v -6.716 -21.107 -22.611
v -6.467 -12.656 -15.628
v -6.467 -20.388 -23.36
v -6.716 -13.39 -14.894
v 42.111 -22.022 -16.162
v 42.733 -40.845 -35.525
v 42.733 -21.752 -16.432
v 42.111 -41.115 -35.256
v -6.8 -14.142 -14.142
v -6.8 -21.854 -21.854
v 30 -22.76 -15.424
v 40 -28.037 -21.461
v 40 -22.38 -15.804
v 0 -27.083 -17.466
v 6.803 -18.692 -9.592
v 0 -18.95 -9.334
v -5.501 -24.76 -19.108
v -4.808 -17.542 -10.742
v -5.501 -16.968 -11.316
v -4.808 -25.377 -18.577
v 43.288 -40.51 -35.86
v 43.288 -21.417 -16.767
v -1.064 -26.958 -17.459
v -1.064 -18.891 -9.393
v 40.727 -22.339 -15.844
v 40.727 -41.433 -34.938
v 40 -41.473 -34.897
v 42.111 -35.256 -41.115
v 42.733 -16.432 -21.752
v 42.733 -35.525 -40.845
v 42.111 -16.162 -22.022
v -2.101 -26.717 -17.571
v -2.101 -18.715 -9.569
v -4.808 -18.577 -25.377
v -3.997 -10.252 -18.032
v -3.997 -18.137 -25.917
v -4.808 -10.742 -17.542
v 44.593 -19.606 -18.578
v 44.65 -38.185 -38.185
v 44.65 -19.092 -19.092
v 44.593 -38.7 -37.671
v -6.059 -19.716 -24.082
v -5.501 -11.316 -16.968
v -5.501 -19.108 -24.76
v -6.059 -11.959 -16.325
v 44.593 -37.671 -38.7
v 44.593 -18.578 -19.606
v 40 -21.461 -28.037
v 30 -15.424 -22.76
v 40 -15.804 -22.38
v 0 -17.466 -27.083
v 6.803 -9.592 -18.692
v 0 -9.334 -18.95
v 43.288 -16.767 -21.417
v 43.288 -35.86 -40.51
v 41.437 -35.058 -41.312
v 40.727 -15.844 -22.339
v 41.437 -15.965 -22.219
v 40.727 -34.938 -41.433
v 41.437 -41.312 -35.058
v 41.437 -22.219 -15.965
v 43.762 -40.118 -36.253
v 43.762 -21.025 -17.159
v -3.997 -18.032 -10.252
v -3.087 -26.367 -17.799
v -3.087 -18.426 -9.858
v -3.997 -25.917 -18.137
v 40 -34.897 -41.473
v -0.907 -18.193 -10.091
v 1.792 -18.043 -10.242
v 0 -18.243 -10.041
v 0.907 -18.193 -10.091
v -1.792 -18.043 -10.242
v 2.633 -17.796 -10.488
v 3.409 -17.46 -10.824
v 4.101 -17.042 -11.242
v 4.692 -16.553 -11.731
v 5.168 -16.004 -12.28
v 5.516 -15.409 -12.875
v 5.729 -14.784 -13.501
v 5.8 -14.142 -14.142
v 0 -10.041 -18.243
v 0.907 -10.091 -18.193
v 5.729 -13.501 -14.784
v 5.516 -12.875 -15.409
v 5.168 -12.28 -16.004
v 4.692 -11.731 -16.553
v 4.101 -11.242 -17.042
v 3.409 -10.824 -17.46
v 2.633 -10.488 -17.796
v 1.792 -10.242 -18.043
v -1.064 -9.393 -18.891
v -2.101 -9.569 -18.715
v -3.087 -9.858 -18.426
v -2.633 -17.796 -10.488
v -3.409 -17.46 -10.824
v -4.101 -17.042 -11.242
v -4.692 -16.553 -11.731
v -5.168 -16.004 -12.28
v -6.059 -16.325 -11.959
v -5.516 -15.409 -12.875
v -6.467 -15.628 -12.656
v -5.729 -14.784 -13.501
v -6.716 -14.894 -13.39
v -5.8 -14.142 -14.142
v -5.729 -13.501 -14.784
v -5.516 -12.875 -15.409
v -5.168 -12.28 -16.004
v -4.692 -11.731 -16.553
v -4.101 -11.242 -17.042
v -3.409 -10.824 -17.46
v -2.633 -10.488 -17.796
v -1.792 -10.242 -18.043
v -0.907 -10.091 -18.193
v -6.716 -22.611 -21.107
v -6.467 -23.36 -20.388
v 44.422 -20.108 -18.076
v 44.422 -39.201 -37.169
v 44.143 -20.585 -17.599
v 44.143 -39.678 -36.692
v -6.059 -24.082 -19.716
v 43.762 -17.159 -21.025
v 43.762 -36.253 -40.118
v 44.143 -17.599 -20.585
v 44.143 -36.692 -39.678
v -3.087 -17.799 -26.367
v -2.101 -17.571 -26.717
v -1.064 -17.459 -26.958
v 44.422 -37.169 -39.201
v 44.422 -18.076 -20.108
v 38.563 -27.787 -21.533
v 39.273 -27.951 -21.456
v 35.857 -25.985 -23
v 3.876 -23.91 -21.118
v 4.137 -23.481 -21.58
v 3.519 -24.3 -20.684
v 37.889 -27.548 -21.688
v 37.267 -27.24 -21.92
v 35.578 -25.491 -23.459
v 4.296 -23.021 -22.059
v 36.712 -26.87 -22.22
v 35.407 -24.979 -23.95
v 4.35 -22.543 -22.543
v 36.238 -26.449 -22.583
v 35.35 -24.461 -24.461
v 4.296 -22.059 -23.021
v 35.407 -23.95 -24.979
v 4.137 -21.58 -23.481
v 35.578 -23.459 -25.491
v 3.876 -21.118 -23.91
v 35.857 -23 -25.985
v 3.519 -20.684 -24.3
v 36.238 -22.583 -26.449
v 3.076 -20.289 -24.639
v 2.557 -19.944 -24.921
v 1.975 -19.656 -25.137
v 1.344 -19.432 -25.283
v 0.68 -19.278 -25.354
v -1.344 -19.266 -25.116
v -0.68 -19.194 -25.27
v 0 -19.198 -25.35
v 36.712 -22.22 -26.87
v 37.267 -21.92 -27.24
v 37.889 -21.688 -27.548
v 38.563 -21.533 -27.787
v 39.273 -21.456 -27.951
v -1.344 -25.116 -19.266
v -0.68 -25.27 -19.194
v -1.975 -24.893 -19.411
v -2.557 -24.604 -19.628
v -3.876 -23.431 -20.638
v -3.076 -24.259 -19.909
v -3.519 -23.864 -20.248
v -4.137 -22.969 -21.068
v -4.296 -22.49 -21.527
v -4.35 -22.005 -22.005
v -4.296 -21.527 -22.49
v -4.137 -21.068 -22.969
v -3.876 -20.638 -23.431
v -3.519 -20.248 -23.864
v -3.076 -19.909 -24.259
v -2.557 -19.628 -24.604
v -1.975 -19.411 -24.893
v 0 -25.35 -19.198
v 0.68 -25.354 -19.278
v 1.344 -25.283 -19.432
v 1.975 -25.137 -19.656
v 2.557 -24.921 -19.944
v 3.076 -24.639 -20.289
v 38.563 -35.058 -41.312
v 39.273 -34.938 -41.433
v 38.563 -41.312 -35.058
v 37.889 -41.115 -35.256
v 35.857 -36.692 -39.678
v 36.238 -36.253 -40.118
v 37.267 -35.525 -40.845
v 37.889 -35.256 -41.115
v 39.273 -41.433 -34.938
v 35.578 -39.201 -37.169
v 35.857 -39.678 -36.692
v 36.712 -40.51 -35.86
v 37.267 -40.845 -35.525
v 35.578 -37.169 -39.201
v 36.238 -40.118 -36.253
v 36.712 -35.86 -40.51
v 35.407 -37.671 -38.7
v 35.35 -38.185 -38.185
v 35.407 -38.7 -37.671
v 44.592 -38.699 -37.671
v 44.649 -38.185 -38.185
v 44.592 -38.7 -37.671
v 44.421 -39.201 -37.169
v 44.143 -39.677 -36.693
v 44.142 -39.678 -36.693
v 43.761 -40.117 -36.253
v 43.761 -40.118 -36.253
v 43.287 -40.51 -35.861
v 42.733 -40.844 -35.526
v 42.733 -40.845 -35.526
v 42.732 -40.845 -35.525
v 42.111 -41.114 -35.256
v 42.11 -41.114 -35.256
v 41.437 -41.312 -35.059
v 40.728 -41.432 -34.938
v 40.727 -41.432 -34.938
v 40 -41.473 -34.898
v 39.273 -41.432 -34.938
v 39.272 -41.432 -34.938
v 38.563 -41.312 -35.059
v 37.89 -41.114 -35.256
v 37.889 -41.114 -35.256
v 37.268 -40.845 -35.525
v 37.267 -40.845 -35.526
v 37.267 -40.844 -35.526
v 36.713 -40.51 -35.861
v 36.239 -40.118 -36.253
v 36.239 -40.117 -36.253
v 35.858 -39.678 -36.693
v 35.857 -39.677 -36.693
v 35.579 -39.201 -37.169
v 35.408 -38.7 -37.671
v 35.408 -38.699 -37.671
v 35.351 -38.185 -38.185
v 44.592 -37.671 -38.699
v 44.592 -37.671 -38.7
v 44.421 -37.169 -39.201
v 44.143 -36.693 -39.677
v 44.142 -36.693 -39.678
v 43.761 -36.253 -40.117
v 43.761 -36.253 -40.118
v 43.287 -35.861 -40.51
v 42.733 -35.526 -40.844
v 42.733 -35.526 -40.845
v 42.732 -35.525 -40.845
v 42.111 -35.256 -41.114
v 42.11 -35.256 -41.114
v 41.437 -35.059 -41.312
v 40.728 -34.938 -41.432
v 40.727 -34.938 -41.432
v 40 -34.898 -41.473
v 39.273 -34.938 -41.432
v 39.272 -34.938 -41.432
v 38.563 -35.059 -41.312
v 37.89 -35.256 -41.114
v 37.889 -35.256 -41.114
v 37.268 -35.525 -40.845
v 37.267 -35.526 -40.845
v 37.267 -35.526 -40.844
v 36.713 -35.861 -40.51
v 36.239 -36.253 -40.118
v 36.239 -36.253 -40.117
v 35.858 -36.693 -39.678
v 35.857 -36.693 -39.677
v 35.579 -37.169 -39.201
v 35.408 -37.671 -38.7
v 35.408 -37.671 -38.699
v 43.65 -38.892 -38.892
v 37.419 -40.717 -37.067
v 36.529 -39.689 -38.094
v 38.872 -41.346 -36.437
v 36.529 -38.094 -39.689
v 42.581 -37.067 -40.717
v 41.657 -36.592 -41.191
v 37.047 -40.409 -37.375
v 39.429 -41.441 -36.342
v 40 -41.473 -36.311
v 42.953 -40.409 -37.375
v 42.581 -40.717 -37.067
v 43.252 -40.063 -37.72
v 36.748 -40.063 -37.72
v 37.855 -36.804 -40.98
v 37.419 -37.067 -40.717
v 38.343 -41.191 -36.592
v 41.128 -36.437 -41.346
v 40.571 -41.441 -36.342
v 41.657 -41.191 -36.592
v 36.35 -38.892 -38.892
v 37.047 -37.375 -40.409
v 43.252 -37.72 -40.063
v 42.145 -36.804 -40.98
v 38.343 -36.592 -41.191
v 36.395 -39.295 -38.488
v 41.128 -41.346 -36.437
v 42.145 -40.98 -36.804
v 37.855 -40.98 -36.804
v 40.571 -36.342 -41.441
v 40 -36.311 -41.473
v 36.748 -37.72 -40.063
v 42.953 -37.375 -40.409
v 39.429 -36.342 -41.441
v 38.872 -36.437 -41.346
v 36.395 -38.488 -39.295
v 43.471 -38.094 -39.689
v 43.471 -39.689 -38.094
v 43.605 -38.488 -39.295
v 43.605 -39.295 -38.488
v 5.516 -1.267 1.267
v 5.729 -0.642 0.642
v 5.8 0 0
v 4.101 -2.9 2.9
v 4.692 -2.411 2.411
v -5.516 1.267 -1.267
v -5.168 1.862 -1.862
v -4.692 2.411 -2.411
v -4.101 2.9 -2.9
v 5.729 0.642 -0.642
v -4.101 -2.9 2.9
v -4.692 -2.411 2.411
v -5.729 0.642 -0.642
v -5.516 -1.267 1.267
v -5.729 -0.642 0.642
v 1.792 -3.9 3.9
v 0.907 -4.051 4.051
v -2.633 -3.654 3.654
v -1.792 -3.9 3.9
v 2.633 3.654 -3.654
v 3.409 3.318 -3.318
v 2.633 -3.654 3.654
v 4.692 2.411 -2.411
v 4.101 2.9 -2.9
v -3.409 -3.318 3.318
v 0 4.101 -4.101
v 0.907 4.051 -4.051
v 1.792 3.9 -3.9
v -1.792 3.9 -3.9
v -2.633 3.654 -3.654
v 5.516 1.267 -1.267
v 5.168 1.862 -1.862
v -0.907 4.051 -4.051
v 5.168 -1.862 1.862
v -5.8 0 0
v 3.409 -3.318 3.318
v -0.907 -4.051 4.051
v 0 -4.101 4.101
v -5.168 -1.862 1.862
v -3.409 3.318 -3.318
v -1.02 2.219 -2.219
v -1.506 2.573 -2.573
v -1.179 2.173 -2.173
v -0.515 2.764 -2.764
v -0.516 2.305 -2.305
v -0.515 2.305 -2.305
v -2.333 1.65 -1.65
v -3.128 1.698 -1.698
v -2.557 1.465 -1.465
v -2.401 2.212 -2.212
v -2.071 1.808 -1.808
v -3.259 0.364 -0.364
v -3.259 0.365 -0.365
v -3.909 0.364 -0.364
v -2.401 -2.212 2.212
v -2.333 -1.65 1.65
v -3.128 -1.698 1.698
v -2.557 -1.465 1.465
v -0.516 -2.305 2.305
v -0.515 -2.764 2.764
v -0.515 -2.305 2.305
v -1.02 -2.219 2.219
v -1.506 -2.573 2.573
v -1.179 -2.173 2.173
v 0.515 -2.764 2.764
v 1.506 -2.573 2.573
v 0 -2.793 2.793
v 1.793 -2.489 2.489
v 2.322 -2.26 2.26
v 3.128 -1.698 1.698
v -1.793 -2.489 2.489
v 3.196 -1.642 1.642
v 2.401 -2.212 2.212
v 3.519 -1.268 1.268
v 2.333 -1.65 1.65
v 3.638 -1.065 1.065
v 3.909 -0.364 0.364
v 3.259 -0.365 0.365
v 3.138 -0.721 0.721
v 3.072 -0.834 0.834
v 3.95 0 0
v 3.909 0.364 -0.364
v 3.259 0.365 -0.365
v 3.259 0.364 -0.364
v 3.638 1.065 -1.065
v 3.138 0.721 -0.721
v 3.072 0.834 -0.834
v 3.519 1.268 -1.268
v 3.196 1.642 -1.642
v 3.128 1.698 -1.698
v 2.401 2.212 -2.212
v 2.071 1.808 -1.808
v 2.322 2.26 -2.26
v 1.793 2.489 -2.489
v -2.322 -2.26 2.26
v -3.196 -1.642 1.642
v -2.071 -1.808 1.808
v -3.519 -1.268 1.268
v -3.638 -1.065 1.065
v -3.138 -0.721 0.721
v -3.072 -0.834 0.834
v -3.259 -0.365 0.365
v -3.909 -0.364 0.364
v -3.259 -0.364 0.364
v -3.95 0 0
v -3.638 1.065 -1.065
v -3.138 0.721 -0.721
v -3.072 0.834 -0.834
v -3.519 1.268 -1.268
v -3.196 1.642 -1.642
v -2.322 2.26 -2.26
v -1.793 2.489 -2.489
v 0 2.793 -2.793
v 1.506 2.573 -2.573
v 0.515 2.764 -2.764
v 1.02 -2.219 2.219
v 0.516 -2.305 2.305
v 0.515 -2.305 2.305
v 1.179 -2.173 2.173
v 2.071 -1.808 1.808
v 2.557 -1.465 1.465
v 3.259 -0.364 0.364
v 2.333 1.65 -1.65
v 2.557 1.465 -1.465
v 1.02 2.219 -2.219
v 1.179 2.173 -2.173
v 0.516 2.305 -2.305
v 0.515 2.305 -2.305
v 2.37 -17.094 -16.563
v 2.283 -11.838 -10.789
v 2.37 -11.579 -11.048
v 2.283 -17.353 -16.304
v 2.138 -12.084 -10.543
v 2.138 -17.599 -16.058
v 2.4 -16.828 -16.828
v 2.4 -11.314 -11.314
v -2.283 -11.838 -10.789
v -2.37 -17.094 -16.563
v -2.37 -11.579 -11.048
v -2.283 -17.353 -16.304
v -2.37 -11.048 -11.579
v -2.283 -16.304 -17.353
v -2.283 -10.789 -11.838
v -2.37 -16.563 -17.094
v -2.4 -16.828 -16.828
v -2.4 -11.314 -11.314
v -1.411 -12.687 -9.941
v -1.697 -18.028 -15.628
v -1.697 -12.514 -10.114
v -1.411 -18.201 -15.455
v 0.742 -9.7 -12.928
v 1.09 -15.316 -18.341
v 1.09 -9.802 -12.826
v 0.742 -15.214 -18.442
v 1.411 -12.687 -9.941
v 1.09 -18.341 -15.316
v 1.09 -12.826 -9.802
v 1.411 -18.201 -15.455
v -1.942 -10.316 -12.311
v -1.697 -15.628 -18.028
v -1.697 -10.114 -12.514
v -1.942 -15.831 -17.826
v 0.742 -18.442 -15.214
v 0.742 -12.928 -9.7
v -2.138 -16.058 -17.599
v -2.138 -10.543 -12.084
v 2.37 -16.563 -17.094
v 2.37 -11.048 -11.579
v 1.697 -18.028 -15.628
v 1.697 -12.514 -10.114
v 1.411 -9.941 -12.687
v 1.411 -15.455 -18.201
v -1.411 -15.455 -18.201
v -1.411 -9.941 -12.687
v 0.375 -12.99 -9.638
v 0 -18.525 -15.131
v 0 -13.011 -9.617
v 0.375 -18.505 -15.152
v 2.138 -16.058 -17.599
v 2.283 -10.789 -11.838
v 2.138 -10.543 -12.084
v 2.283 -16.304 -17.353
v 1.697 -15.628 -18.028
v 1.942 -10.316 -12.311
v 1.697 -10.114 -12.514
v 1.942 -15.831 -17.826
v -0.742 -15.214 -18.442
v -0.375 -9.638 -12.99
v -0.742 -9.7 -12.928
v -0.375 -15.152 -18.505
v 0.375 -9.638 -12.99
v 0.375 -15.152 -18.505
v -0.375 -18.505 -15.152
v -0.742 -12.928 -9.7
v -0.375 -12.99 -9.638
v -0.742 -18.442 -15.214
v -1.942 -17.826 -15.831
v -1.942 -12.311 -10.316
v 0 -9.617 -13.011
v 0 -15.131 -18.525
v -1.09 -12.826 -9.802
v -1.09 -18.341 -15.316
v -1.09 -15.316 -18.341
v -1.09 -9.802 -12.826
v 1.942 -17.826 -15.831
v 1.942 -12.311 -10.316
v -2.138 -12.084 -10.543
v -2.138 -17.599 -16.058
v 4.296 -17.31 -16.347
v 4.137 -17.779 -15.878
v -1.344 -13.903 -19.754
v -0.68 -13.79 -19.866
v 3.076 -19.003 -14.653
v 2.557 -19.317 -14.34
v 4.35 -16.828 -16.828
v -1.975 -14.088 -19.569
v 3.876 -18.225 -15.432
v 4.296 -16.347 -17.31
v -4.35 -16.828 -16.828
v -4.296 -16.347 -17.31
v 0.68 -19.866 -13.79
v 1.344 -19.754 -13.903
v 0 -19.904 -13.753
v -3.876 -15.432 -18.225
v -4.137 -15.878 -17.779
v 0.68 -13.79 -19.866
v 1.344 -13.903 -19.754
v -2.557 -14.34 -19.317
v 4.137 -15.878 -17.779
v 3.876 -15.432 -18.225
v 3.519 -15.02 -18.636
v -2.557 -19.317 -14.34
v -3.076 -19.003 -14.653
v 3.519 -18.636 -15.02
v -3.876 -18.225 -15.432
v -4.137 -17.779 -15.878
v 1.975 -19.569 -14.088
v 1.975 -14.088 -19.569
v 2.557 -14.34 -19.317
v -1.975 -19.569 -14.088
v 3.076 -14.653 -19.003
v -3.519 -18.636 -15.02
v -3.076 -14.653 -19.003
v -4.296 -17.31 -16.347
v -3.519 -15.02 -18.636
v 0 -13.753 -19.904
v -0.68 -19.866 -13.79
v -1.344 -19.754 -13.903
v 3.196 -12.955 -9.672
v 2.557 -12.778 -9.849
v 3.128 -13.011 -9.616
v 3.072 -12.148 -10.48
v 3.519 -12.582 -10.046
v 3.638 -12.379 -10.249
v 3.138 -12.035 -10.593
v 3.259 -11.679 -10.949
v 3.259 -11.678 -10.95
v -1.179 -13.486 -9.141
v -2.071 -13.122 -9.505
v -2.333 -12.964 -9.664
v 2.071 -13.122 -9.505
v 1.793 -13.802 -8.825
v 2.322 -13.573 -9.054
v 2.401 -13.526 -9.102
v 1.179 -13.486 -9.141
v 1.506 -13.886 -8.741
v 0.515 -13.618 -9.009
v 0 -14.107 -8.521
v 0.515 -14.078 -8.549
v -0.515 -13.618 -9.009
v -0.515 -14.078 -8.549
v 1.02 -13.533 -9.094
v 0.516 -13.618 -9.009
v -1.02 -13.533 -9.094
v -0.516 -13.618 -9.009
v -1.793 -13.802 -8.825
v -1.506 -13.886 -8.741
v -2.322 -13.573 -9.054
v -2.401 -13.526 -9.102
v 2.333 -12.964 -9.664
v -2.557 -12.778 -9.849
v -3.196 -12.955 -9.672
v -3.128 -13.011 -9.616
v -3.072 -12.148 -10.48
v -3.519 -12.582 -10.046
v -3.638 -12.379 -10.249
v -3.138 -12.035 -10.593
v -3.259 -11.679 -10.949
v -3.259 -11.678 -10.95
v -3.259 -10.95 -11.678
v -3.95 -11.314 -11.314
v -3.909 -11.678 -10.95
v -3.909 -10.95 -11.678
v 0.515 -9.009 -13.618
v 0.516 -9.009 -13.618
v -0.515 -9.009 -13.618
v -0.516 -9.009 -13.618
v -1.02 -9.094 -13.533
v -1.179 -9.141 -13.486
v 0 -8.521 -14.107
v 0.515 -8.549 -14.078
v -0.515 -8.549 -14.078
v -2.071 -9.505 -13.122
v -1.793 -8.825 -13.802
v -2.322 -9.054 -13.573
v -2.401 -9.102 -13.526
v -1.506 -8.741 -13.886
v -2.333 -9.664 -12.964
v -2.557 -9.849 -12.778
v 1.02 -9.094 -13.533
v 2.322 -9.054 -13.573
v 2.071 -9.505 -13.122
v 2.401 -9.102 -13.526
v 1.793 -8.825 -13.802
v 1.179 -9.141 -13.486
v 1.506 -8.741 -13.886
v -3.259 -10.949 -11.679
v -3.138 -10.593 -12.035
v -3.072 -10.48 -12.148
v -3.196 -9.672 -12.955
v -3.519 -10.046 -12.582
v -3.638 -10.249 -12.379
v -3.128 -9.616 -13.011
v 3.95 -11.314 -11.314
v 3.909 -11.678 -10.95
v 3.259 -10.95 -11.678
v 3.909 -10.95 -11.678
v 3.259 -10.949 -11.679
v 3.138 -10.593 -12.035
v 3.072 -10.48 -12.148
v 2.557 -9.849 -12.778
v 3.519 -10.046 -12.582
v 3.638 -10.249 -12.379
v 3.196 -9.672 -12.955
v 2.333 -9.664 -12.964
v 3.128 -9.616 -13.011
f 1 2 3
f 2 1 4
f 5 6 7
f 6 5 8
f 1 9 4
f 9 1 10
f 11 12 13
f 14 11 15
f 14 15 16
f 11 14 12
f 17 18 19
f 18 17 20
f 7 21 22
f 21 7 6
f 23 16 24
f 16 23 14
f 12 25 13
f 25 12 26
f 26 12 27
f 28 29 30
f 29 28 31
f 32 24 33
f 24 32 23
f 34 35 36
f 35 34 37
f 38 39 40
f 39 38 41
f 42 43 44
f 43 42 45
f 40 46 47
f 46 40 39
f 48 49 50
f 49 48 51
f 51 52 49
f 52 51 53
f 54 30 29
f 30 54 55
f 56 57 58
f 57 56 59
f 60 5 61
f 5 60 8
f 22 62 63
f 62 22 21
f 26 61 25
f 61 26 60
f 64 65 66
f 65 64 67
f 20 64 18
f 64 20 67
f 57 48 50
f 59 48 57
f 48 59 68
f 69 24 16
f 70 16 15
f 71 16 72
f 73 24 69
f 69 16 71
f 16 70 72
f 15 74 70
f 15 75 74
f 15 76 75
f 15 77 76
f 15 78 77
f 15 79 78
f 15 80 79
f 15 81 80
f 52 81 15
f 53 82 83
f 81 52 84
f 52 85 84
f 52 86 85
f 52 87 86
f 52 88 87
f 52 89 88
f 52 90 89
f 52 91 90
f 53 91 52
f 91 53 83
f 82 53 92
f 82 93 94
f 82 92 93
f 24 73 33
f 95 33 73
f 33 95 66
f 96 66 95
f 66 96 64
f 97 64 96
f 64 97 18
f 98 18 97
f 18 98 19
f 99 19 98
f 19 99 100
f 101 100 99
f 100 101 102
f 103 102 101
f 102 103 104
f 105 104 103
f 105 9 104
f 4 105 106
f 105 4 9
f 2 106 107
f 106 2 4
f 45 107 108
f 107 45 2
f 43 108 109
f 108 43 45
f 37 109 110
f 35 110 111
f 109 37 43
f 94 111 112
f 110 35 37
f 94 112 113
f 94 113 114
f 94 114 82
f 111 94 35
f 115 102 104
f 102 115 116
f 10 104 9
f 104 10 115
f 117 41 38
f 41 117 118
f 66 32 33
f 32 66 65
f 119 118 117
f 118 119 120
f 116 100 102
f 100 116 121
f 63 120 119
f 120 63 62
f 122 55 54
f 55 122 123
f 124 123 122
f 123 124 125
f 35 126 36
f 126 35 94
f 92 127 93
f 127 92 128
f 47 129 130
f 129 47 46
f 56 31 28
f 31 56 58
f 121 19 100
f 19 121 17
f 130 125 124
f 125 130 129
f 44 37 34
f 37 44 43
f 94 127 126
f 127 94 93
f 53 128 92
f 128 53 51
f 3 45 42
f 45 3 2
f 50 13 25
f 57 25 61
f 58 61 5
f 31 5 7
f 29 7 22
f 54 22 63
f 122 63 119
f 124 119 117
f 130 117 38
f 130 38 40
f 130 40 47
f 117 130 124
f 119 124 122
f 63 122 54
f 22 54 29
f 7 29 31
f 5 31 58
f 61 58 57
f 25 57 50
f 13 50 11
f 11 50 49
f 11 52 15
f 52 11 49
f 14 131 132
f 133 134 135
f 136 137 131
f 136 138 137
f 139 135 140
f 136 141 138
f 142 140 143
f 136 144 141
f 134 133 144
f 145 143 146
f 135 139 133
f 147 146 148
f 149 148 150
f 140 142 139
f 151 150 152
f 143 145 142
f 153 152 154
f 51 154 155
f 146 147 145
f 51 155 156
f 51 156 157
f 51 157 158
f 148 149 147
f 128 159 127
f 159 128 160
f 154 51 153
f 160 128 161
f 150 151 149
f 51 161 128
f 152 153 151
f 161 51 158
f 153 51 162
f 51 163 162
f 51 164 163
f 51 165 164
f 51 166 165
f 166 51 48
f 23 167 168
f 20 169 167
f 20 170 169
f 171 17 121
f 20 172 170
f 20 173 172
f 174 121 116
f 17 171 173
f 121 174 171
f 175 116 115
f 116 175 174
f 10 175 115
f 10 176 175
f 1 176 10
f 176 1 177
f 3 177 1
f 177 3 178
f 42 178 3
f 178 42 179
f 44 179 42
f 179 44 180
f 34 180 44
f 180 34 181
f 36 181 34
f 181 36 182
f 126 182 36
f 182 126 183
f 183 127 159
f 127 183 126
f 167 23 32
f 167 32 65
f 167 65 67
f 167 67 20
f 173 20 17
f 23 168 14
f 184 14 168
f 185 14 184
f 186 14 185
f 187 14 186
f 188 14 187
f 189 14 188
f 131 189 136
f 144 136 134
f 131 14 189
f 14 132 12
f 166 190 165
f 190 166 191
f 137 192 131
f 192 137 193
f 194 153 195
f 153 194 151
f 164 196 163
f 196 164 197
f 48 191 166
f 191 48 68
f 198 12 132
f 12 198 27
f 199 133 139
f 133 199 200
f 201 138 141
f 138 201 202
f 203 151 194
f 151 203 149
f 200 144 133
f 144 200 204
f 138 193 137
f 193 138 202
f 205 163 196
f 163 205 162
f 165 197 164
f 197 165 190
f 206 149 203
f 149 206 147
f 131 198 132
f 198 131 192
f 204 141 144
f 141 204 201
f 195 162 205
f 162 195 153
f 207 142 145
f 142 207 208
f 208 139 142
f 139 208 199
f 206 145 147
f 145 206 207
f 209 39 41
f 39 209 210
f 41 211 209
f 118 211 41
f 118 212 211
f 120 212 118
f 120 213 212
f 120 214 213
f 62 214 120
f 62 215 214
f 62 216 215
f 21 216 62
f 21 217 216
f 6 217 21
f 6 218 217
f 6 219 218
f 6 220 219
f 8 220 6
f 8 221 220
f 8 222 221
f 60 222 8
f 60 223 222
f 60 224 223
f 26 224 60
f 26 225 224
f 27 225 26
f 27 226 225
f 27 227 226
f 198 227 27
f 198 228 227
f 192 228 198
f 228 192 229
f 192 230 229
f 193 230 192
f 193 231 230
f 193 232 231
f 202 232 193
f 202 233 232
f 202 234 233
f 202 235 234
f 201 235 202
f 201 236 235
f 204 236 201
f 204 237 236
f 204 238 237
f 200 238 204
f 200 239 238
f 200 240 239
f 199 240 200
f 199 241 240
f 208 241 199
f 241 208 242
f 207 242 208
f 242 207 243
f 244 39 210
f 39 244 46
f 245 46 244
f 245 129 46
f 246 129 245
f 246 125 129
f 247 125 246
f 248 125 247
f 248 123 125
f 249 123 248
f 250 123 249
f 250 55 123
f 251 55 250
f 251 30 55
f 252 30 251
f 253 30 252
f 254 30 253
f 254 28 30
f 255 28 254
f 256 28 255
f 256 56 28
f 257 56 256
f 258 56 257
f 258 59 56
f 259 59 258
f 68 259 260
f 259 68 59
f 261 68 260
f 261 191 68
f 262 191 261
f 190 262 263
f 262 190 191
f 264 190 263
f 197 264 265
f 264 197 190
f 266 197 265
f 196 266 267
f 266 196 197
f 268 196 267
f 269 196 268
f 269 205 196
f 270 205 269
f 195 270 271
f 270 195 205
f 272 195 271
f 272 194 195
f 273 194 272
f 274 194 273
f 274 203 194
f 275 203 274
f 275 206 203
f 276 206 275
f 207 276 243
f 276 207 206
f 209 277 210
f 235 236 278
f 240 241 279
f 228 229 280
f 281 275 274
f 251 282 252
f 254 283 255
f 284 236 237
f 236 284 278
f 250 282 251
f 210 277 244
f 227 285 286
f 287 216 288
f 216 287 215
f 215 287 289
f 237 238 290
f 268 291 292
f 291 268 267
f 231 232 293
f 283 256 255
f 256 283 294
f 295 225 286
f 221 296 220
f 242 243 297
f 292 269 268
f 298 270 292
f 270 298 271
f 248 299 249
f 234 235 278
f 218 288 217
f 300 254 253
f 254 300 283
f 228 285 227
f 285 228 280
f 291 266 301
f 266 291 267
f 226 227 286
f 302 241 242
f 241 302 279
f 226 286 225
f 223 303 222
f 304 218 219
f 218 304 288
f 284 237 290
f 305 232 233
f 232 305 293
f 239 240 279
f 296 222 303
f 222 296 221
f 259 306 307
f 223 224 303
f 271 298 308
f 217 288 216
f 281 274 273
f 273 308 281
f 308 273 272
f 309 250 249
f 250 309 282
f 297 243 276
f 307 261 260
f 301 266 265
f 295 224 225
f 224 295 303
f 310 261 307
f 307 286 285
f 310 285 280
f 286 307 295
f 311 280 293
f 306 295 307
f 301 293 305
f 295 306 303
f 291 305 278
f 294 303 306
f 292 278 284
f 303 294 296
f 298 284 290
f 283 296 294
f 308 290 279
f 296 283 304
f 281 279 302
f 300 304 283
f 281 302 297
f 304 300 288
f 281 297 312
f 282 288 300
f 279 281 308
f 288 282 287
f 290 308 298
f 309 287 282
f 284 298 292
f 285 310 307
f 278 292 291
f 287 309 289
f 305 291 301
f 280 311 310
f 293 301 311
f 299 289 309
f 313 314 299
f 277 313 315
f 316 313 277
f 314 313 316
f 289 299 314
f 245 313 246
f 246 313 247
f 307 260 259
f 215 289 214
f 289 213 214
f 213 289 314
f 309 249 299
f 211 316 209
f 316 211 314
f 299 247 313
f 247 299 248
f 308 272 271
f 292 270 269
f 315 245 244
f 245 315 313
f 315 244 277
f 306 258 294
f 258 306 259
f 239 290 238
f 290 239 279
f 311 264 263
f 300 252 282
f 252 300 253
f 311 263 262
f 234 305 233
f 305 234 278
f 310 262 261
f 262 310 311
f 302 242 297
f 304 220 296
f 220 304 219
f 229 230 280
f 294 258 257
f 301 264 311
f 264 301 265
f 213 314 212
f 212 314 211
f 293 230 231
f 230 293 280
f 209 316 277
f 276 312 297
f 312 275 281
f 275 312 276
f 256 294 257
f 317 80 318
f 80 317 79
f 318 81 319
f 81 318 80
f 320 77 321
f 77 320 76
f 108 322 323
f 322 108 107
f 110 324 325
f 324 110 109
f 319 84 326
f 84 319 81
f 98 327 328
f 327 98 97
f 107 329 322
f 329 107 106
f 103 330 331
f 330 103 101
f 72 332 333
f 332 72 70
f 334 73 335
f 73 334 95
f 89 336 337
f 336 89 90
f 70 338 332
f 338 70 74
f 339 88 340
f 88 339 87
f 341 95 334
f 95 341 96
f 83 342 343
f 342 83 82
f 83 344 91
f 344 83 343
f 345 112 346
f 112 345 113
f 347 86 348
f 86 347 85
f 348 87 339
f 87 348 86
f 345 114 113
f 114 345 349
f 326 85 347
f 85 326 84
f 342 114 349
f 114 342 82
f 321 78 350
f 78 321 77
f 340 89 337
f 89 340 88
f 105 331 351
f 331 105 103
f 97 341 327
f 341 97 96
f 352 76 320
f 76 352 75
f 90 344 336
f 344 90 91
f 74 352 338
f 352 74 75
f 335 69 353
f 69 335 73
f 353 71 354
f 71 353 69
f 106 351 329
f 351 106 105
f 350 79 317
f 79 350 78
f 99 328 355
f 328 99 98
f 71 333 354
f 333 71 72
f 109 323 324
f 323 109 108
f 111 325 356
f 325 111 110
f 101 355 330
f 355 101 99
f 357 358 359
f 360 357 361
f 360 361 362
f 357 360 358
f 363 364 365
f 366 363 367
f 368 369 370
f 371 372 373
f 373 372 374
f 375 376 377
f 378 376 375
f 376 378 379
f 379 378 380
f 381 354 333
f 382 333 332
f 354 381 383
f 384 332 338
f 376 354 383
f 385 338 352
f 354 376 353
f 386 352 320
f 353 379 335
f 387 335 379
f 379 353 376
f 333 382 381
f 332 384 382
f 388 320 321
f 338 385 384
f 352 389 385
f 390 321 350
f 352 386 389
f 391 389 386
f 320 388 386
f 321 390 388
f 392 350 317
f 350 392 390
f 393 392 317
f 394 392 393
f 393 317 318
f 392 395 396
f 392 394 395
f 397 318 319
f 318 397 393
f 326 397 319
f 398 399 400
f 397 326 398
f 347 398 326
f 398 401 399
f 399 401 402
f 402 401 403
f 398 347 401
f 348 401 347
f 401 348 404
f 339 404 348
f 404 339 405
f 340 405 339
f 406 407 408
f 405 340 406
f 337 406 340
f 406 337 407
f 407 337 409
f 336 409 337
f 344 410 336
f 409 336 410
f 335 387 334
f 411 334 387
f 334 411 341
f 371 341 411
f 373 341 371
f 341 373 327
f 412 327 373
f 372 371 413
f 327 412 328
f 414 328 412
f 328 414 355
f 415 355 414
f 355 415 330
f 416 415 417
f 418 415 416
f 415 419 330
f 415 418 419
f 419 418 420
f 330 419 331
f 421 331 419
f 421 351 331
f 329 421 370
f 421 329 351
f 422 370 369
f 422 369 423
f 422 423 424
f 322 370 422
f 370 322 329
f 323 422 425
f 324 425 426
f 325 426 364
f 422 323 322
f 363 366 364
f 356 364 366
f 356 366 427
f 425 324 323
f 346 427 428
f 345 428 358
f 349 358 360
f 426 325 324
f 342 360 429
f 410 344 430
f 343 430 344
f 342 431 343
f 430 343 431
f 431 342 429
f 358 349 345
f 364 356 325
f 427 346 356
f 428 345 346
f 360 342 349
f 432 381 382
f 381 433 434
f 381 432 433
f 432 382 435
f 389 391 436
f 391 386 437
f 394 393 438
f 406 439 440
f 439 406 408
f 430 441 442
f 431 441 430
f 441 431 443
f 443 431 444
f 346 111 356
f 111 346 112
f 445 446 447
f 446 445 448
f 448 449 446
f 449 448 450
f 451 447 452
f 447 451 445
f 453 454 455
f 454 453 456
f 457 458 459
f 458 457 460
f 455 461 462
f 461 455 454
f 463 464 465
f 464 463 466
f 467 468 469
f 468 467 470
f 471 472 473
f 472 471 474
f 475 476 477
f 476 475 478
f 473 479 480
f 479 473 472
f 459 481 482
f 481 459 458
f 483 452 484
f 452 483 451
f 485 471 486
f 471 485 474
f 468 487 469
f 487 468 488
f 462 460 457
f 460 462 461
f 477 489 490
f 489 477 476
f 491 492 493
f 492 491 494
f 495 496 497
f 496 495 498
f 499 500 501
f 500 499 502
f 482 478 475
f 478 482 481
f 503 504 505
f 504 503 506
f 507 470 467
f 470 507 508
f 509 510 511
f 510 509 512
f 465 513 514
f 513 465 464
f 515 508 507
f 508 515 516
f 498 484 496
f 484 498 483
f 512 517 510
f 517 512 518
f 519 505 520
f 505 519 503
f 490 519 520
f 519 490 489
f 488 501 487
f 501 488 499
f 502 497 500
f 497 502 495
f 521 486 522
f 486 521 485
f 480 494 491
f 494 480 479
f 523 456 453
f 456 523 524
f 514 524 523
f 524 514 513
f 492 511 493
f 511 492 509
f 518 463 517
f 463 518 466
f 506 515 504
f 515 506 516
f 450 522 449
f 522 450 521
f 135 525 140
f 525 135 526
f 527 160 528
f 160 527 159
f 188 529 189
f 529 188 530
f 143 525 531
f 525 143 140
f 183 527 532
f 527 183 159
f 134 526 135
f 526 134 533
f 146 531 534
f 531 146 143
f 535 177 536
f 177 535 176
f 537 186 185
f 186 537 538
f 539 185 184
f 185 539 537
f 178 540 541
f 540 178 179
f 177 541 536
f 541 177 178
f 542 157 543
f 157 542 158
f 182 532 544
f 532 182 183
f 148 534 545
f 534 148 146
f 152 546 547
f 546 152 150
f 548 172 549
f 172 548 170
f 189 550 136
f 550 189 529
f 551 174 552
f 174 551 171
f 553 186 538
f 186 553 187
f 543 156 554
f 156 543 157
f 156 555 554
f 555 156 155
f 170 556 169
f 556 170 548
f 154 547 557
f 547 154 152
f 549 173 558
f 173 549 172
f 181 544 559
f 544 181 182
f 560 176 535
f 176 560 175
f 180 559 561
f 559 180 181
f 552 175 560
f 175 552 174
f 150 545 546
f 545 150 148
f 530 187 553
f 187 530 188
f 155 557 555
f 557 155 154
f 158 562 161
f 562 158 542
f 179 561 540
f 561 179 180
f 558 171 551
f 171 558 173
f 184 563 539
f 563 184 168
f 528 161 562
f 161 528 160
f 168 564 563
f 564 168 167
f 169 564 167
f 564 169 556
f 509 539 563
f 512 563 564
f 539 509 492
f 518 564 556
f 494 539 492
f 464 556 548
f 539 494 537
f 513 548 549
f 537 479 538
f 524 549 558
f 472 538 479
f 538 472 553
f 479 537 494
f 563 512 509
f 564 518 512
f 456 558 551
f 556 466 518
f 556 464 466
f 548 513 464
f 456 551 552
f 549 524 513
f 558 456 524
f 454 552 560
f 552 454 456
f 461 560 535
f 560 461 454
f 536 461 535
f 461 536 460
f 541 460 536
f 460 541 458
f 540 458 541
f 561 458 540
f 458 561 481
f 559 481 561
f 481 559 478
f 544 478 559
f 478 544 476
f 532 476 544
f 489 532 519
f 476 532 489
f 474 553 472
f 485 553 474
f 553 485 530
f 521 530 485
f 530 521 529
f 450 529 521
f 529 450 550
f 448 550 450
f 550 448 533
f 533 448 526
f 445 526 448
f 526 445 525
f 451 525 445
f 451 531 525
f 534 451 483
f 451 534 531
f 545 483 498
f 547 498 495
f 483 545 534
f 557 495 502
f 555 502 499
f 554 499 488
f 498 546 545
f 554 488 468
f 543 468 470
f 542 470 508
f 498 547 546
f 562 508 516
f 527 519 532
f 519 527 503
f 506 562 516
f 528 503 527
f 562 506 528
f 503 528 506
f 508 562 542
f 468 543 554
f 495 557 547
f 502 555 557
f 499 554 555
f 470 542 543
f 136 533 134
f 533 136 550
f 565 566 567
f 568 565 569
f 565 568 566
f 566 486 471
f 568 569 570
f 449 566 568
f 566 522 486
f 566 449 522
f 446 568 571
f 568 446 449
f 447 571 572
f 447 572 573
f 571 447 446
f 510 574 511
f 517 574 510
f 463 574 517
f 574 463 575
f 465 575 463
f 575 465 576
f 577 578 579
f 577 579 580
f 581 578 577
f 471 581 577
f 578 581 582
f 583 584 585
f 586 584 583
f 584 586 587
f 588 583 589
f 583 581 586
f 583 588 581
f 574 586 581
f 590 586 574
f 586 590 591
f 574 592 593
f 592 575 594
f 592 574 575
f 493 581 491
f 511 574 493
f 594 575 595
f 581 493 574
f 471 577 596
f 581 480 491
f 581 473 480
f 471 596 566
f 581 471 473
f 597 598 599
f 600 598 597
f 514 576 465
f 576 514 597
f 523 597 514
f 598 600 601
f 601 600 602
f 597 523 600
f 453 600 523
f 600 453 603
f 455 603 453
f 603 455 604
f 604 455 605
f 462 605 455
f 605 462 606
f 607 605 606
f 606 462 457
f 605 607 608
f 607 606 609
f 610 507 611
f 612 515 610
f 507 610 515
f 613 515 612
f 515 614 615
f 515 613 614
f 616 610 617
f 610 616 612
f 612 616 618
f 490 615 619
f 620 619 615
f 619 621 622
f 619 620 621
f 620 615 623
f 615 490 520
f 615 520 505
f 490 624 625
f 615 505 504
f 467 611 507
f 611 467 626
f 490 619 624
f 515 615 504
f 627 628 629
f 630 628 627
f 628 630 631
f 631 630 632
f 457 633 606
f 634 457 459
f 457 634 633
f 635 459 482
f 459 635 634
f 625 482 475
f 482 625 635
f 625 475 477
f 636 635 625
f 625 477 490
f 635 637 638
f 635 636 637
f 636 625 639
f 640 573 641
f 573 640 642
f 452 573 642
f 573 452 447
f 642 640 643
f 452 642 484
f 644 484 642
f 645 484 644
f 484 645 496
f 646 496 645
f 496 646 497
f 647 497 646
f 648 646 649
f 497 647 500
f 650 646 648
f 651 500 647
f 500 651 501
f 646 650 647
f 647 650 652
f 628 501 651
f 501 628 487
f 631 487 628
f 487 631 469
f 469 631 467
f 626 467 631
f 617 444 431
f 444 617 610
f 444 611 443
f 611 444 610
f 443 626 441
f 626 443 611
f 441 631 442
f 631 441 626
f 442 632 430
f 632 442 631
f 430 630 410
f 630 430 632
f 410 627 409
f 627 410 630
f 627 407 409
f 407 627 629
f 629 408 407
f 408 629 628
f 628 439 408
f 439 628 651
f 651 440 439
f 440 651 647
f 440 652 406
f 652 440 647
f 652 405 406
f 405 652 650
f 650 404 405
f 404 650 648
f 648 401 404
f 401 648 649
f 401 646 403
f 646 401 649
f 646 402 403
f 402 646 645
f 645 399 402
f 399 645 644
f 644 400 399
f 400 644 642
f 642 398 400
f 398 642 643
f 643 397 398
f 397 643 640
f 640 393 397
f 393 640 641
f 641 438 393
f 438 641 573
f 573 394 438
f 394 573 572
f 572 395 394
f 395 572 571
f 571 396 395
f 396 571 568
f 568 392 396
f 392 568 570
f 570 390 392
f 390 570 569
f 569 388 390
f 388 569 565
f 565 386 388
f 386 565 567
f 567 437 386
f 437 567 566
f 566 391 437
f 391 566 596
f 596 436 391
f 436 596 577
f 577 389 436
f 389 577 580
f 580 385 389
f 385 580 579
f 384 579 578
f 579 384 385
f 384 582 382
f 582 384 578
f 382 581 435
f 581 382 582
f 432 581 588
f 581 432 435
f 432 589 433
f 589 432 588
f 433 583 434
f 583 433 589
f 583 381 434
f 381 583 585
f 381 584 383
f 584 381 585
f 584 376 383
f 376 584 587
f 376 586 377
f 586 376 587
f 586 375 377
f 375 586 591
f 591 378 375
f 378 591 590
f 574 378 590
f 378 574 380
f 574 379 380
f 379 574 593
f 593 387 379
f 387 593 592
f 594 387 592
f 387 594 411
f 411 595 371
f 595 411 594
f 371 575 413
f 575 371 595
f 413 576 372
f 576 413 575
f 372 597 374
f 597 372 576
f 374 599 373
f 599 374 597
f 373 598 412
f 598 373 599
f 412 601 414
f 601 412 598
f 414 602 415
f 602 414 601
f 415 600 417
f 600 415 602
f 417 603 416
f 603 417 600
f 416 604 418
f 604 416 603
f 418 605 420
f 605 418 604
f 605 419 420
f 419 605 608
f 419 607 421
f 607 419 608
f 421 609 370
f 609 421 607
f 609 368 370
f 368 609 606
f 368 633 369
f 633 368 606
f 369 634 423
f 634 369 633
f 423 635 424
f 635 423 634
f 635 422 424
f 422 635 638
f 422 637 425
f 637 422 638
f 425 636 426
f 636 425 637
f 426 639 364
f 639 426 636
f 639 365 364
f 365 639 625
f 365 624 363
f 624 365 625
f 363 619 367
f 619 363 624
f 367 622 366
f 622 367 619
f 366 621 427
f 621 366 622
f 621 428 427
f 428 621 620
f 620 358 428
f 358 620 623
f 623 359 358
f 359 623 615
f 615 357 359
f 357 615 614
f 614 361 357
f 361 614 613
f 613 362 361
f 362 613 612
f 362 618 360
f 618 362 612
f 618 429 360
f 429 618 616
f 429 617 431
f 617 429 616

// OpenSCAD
eps = 0.001;
$fn = 40;

spline_count = 12;

spline_id_max = 7.9;
spline_id_min = 6.6;

screw_hole_id = 4.8;
screw_head_hole_id = 8.7;

shaft_od = 11.6;
arm_base_od = 13.6;
arm_end_od = 9.3;

shaft_length = 20;
arm_radius = 40;
crank_height = 15;
handle_length = 35;

extended = false;

module plug() {
  spline_length = 16;
  screw_hold_length = 7.8;
  
  translate([0, 0, -eps]) {
    linear_extrude(spline_length + eps) {
      circle(d=spline_id_min);
      intersection() {
        circle(d=spline_id_max);
        for (a = [0:5])
          rotate([0, 0, a*30])
            square([100, 1.03], center=true);
      }
    }
    translate([0, 0, spline_length]) {
      linear_extrude(screw_hold_length + eps)
        circle(d=screw_hole_id);
      translate([0, 0, screw_hold_length]) {
        linear_extrude(50)
          circle(d=screw_head_hole_id);
      }
    }
  }
}

module exterior() {
  extension = extended ? 15 : 0;
  
  // Bottom shaft.
  cylinder(h=shaft_length + extension + eps, d=shaft_od);
  
  if (extended)
    translate([0, 0, shaft_length])
      linear_extrude(extension+eps)
        hull()
          circle(d=arm_base_od);
  
  // Crank arm.
  translate([0, 0, shaft_length + extension]) {    
    difference() {
      linear_extrude(crank_height) {
        hull() {
          circle(d=arm_base_od);
          translate([arm_radius, 0])
            circle(d=arm_end_od);
        }
      }
      
      // Cut out the bottom.
      translate([0, -10, 0]) {
        hull() {
          translate([arm_base_od/2, 0, -20-eps])
            cube(20);
          translate([arm_radius-10, 0, -13])
            cube(20);
        }
      }
      
      // Cut out the top.
      scale([-1, 1, 1])
        translate([-arm_radius, -50, crank_height])
          rotate([0, 5, 0])
            translate([arm_radius-50, 0, 0])
              cube(100);
    }
  }
  
  // Handle.
  translate([arm_radius, 0, shaft_length + extension + 7 + eps]) {
    cylinder(h=handle_length-8+eps, d=arm_end_od);
    translate([0, 0, handle_length-8])
      cylinder(h=1, d1=arm_end_od, d2=arm_end_od-2);
  }
}

module piece() {
  rotate([135, 0, 0]) {
    difference() {
      exterior();
      plug();
    }
  }
}

module support() {
  linear_extrude(50)
    offset(-1)
      projection()
        piece();
}

piece();
